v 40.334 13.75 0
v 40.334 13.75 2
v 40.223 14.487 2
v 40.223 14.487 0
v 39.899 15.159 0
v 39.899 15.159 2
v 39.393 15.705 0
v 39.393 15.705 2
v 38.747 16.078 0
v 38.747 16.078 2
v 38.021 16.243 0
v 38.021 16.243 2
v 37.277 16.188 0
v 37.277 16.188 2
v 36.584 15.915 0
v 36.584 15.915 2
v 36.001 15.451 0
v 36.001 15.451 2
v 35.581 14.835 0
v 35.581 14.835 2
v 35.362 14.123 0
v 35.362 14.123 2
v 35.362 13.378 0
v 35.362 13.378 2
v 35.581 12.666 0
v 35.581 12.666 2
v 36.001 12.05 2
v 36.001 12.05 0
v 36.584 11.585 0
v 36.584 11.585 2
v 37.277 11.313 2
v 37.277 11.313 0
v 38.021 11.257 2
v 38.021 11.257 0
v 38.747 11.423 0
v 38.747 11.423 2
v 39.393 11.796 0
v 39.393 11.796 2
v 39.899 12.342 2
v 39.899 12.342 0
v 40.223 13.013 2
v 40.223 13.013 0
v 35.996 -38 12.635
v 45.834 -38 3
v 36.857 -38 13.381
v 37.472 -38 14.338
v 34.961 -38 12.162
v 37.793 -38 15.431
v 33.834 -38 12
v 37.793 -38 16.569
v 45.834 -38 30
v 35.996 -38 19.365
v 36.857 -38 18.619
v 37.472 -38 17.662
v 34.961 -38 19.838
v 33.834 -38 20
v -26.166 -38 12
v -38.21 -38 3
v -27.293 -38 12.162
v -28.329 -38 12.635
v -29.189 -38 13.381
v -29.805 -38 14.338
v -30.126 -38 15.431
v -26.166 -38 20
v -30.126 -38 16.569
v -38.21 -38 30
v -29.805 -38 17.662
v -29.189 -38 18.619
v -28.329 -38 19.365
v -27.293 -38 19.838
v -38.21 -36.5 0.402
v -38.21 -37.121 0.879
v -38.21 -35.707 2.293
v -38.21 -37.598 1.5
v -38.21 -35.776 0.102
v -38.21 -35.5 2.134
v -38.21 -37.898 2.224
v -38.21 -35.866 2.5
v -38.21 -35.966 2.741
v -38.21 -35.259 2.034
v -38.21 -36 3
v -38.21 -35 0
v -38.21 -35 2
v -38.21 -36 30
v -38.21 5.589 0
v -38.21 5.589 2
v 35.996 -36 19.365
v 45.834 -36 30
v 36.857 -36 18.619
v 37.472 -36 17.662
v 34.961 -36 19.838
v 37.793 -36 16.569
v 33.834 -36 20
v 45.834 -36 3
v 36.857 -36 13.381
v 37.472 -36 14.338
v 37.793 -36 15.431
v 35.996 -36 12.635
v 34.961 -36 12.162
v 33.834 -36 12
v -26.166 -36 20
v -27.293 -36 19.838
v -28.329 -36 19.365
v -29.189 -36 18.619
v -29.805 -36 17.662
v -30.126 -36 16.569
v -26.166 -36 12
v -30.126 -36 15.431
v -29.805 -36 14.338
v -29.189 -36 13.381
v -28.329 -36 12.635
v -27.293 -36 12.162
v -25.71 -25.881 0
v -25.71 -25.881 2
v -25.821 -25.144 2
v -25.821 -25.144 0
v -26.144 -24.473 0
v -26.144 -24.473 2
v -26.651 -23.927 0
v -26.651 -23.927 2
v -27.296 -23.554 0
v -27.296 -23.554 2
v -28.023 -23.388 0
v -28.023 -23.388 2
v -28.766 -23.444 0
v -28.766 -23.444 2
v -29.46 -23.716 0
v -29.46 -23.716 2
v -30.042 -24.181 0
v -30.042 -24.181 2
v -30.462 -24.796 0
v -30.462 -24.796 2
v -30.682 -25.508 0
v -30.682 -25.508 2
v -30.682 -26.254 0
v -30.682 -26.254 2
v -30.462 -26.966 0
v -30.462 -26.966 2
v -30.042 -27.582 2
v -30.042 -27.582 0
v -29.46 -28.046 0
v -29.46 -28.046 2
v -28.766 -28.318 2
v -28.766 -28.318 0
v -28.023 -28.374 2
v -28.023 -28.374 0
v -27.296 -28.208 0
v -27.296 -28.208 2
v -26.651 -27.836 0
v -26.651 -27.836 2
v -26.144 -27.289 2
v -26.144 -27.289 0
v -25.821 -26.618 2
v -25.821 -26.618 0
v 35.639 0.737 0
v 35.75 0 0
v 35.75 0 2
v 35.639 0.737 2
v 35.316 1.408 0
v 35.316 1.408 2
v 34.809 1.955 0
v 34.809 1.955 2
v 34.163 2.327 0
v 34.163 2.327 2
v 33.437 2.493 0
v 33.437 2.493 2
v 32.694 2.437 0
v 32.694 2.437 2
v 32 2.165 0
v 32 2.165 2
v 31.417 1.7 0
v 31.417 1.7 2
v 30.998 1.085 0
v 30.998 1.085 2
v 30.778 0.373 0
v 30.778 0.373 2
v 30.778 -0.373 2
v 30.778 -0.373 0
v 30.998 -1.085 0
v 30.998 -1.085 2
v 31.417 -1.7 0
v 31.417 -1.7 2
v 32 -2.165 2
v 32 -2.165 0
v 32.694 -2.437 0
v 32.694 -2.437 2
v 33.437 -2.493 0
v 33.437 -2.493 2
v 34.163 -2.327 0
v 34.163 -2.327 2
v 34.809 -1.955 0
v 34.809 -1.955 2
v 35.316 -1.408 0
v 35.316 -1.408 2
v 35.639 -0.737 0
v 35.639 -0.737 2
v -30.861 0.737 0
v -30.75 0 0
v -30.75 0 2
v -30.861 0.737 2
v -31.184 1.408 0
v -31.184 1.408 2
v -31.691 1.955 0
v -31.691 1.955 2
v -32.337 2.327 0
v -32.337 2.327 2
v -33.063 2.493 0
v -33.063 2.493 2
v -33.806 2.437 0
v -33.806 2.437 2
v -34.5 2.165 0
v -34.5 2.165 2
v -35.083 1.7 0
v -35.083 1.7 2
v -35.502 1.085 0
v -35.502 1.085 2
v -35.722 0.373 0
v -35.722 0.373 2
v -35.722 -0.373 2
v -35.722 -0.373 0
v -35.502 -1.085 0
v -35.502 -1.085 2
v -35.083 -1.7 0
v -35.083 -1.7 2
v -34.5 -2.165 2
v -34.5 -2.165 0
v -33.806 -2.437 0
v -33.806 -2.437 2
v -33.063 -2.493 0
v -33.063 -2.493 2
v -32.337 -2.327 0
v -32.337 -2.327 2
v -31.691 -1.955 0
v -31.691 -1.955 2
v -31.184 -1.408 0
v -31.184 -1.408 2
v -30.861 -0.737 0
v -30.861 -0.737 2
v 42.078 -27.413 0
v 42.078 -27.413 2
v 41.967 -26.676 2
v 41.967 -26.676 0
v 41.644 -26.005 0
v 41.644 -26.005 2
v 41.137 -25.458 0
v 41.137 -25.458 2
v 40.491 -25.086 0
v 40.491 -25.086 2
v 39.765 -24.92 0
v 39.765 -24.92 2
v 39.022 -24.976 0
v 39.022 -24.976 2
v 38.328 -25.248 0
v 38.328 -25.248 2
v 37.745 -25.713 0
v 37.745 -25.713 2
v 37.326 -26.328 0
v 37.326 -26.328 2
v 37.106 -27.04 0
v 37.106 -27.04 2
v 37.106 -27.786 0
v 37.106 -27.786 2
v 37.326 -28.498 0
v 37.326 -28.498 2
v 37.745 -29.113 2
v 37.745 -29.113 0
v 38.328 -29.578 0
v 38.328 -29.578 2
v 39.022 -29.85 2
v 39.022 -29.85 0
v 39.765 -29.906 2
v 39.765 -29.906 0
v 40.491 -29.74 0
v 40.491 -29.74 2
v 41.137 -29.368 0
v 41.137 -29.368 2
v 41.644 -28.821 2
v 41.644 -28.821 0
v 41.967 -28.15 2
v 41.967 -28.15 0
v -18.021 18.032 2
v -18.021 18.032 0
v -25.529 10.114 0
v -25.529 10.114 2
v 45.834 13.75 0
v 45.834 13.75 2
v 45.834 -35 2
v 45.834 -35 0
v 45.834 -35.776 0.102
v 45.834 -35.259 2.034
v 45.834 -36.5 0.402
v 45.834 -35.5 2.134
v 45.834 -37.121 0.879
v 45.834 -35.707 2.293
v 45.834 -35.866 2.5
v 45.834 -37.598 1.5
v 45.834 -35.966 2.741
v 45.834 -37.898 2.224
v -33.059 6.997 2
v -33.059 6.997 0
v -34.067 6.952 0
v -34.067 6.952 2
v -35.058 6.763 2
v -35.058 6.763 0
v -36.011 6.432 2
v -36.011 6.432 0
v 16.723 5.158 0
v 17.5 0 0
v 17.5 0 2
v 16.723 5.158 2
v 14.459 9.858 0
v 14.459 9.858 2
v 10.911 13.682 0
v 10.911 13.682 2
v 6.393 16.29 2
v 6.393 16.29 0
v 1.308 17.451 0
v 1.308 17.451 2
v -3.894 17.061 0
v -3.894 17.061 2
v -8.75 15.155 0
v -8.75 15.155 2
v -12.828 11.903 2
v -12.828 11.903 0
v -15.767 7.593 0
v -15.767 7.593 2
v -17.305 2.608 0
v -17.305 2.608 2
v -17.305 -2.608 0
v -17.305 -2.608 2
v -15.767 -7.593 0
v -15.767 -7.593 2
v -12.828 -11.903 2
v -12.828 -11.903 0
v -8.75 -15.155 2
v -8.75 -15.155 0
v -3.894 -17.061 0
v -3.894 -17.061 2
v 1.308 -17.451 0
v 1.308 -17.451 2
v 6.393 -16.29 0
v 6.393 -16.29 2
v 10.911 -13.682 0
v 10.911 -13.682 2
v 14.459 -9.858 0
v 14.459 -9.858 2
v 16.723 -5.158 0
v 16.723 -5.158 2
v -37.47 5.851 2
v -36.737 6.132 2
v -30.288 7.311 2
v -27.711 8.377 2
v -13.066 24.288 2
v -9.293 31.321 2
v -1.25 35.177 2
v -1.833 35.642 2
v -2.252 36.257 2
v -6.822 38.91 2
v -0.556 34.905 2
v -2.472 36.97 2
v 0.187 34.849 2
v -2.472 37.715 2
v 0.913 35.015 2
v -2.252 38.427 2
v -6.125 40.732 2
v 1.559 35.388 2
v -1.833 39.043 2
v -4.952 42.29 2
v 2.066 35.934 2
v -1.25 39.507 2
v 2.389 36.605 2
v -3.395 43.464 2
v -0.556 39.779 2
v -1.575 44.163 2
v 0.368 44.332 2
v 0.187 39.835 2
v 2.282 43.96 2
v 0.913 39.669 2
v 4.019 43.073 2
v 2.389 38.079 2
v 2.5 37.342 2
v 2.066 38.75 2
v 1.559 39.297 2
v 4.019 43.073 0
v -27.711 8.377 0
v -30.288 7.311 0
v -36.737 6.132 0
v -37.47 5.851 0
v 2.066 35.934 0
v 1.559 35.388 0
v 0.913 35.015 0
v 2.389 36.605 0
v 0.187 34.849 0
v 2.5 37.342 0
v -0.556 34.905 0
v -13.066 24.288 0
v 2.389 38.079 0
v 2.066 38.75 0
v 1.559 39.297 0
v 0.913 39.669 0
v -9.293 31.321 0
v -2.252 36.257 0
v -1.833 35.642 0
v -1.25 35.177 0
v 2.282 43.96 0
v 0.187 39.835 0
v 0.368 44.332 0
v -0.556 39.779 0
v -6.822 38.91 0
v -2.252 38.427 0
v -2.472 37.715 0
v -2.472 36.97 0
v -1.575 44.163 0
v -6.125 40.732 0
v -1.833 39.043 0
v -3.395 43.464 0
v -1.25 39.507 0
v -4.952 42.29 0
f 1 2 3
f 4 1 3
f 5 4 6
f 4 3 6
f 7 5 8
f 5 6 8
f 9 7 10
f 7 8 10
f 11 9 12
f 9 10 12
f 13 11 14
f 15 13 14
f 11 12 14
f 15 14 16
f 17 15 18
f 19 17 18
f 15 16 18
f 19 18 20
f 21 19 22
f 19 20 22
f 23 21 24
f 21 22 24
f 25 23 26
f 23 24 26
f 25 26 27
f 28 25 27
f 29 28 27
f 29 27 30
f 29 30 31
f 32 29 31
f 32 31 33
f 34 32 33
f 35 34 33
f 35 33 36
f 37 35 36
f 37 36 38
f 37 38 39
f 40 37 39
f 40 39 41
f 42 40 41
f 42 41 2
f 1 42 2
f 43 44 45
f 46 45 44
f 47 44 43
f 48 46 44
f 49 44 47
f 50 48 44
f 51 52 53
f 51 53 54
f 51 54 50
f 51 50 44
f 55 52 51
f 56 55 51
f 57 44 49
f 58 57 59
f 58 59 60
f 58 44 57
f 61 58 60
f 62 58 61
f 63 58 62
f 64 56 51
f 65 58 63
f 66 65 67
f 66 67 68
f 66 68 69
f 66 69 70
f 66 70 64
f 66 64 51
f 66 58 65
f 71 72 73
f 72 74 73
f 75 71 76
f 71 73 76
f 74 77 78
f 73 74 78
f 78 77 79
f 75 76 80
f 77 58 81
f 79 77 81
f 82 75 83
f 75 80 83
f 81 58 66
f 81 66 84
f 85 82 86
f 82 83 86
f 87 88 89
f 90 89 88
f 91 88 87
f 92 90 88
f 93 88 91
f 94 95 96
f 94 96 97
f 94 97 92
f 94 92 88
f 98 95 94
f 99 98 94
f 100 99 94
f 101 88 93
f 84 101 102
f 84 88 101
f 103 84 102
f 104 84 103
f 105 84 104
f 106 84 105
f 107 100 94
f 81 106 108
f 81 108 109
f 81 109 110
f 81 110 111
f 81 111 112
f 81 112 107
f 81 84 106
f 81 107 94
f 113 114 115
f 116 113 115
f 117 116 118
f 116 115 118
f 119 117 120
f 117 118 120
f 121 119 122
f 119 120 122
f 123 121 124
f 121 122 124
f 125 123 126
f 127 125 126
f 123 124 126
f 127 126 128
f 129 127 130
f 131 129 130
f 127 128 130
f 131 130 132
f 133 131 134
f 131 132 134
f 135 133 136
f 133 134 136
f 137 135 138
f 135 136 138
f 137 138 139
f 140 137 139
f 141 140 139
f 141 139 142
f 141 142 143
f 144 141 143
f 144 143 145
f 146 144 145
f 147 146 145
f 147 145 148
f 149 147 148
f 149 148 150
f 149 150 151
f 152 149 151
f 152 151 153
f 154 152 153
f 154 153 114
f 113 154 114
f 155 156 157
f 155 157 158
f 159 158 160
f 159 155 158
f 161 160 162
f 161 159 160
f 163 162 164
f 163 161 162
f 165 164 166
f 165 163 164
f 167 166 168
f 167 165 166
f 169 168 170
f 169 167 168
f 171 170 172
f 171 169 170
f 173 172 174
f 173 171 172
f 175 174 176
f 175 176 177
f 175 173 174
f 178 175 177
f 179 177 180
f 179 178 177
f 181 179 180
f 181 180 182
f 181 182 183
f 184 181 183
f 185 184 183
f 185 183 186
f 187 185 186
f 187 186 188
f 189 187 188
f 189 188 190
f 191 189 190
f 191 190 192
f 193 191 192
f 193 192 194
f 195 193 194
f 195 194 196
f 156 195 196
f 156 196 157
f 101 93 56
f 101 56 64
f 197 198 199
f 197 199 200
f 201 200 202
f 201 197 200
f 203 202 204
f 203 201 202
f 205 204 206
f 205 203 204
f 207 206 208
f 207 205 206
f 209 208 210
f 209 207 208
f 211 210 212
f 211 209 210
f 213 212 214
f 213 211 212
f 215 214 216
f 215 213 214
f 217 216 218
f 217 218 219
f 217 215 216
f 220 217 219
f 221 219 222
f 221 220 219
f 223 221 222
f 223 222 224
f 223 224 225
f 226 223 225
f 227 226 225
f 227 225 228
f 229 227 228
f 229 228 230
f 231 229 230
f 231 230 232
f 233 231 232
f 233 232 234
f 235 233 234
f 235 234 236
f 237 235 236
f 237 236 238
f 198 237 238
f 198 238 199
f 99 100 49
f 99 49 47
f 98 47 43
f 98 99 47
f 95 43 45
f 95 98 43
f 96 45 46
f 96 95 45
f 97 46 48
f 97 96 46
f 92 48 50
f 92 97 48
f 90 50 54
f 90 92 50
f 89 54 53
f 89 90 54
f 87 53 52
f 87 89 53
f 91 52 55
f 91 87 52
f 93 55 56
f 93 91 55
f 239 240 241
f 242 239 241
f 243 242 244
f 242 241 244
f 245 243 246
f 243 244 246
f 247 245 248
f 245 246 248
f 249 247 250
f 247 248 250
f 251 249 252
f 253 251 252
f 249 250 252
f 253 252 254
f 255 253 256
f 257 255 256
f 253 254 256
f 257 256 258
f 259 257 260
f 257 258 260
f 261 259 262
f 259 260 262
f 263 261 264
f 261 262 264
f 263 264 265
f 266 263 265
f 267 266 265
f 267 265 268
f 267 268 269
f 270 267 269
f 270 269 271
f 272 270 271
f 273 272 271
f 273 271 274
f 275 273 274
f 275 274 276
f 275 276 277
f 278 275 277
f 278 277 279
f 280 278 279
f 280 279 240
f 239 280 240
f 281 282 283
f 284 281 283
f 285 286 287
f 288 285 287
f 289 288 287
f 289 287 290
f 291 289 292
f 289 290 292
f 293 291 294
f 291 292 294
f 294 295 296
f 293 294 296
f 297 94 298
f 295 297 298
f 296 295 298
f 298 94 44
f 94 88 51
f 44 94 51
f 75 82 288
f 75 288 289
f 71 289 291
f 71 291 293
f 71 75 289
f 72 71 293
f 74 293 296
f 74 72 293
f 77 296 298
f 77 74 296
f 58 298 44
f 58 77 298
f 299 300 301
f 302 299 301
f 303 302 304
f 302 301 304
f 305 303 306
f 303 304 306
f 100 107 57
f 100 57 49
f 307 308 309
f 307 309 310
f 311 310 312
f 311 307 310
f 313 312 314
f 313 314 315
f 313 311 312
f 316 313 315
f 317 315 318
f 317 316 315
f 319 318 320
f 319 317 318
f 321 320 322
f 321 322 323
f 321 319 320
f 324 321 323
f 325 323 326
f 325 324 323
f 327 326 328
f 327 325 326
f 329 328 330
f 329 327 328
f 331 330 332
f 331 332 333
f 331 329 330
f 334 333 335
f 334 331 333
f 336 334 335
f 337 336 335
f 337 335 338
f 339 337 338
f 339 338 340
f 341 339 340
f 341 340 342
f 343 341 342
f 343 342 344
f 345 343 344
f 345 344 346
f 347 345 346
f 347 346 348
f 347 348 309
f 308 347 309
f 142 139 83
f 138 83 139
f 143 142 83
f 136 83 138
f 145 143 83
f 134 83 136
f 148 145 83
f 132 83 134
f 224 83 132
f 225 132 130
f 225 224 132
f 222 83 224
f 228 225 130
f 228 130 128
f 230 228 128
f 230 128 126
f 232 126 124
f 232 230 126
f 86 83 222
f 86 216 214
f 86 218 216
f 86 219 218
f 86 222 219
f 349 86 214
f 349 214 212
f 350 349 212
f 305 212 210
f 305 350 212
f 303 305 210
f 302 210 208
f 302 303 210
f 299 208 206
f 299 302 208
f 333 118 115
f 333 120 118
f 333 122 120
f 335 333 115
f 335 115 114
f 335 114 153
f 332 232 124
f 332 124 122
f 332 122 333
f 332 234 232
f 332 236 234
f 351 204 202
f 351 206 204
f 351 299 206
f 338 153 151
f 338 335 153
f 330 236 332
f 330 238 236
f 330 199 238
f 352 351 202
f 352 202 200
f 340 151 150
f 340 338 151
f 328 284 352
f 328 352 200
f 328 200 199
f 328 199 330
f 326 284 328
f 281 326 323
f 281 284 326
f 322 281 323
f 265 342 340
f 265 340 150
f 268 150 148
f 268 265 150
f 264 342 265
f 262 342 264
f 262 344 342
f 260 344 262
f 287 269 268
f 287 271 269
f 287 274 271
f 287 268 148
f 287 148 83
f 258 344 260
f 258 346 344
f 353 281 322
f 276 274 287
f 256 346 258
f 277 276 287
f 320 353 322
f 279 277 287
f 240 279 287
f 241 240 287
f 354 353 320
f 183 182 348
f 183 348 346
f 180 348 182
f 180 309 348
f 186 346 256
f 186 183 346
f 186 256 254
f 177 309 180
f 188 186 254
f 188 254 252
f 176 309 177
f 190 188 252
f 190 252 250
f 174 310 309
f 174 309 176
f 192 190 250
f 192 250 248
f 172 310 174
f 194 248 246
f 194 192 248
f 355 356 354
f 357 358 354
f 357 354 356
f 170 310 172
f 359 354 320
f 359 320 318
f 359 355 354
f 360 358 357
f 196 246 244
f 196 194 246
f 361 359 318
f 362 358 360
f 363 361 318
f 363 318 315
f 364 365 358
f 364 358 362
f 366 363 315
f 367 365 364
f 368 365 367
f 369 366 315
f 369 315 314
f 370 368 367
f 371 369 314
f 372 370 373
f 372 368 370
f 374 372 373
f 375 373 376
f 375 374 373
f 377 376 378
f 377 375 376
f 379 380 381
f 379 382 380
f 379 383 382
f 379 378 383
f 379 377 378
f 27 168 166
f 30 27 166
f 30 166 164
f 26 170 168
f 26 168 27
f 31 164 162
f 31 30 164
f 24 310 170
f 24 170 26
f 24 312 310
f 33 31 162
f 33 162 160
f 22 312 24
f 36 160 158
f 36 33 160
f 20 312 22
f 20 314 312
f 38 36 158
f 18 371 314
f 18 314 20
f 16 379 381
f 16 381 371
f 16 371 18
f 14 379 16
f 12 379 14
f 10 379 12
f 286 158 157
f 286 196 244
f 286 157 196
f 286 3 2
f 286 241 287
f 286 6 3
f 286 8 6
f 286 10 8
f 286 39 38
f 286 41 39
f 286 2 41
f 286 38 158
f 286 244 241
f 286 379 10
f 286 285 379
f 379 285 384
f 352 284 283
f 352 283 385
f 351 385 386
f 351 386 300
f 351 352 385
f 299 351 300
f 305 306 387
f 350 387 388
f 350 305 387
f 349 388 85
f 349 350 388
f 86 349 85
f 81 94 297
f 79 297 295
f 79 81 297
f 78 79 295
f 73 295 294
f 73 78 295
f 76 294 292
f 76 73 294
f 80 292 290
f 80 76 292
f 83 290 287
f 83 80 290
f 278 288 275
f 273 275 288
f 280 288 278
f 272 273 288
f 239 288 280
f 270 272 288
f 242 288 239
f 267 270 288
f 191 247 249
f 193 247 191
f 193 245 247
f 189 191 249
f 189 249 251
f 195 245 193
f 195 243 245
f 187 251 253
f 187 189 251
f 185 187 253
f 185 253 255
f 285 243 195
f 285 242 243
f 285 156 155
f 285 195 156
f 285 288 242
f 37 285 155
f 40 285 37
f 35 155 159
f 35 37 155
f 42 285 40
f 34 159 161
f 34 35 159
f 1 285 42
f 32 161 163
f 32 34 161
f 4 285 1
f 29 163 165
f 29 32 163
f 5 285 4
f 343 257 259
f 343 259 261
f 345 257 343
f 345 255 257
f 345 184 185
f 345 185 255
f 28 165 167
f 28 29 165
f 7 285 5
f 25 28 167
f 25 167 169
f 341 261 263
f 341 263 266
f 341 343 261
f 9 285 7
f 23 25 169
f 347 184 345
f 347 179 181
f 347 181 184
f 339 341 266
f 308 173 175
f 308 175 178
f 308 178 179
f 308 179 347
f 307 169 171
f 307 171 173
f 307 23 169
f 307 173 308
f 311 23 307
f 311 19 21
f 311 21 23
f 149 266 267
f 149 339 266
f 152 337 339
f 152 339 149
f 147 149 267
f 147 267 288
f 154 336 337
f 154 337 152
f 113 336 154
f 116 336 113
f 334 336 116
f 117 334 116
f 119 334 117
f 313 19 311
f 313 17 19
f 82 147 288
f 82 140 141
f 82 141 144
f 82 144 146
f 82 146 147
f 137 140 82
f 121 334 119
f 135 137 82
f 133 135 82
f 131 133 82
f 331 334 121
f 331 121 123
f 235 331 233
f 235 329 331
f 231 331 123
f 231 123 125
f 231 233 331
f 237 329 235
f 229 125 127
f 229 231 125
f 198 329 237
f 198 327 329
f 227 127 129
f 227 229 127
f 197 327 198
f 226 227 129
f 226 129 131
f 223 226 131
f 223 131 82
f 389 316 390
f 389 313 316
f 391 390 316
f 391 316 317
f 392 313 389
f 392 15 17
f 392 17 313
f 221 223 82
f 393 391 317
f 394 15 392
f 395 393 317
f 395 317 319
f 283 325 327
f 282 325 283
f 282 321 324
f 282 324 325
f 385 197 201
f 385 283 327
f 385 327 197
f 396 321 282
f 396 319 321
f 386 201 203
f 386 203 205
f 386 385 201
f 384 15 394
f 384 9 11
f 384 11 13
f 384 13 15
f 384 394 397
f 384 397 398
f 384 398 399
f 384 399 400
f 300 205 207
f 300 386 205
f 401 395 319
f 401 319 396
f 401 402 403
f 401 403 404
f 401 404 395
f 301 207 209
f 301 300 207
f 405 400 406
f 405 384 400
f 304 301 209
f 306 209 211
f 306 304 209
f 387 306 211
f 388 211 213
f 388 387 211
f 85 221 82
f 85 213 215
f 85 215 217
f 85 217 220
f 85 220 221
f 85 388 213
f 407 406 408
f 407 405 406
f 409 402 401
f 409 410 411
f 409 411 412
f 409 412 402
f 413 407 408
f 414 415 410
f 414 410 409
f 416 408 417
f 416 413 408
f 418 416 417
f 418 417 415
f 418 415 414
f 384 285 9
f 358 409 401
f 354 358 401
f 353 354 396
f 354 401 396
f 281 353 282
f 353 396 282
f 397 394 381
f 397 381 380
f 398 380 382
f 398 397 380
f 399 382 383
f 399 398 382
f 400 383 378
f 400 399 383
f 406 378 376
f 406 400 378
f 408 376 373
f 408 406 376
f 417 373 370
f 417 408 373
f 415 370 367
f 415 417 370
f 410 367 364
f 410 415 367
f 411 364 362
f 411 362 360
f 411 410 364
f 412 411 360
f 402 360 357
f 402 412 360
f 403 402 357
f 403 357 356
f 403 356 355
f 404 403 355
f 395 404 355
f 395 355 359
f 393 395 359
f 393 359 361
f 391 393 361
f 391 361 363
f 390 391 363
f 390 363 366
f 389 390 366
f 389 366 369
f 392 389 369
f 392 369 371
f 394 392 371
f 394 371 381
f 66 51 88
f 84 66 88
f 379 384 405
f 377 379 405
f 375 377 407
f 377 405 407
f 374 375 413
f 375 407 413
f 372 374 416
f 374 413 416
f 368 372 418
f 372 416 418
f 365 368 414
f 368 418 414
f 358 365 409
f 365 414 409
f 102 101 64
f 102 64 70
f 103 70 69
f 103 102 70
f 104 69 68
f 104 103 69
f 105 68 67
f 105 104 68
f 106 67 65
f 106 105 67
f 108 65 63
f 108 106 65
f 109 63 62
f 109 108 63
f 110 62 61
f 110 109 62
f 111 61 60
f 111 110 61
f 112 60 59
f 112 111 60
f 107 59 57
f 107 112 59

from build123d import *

# Parameters (mm, degrees)
SKETCH1_R                  = 2.138138955
SKETCH1_R_2                = 2.5
SKETCH1_R_3                = 17.5
BOSS_EXTRUDE1_DEPTH        = 4
FILLET4_R                  = 10
FILLET8_R                  = 30
SKETCH2_R                  = 2
BOSS_EXTRUDE2_DEPTH        = 4
FILLET10_R                 = 4
SKETCH3_R                  = 2.5
SKETCH3_R_2                = 2.138138955
BOSS_EXTRUDE3_DEPTH        = 4
SKETCH4_W                  = 172.930913202
SKETCH4_H                  = 8.75
BOSS_EXTRUDE4_DEPTH        = 4
CUT_EXTRUDE1_REACH         = 123.687
CONVERT_SOLID1_START       = 2
CONVERT_SOLID1_OUTLINE_R   = 2.138138955
CONVERT_SOLID1_OUTLINE_R_2 = 2.5
CONVERT_SOLID1_OUTLINE_R_3 = 17.5
CONVERT_SOLID1_OUTLINE_R_4 = 2
CONVERT_SOLID1_DEPTH       = 2
EDGE_FLANGE1_DEPTH         = 159.04353712
CUT_EXTRUDE2_REACH         = 144.058
CUT_EXTRUDE3_REACH         = 126.803
SKETCH15_R                 = 2.5
CUT_EXTRUDE4_DEPTH         = 126.266876508
CUT_EXTRUDE4_DEPTH_BACK    = 126.266876508
SKETCH16_W                 = 75
SKETCH16_H                 = 51.529180682
SKETCH17_R                 = 2.5
CUT_EXTRUDE5_DEPTH         = 70.648854106


# Read off the part's stored shape, not the designer's step: Convert-Solid1
# Sheet-metal steps are written as plain solids
with BuildPart() as part:
    # Sketch1 → Boss-Extrude1 (new body)
    with BuildSketch(Plane.XY):
        with BuildLine():
            Line((57.269086776, 5.73122513), (4.019086776, 43.073392983))
            ThreePointArc((4.019086776, 43.073392983), (-2.50930732, 43.876949929), (-6.822053045, 38.910476579))
            ThreePointArc((-6.822053045, 38.910476579), (-11.022997654, 27.721065982), (-18.021357649, 18.032216591))
            Line((-18.021357649, 18.032216591), (-29.508168792, 5.915969846))
            ThreePointArc((-29.508168792, 5.915969846), (-34.635809661, 6.861452586), (-38.994562647, 4))
            Line((-38.994562647, 4), (-49.854306759, 4))
            ThreePointArc((-49.854306759, 4), (-50.678108889, 3.992458813), (-51.501911019, 4))
            Line((-51.501911019, 4), (-103.25, 4))
            ThreePointArc((-103.25, 4), (-113.23757059, -5.501568758), (-104.245623443, -15.950313259))
            Line((-104.245623443, -15.950313259), (-2.613511537, -26.119572306))
            ThreePointArc((-2.613511537, -26.119572306), (3.534961315, -26.010892882), (9.48943662, -24.474743975))
            Line((9.48943662, -24.474743975), (55.780516432, -6.526598393))
            ThreePointArc((55.780516432, -6.526598393), (60.198948476, -0.84386911), (57.269086776, 5.73122513))
        make_face()
        with Locations((-93.25, -6)):
            Circle(SKETCH1_R, mode=Mode.SUBTRACT)
        with Locations((-69.427494877, -8.934369314)):
            Circle(SKETCH1_R_2, mode=Mode.SUBTRACT)
        with Locations((-43.206195341, -14.414354512)):
            Circle(SKETCH1_R_2, mode=Mode.SUBTRACT)
        with Locations((-33.25, 0)):
            Circle(SKETCH1_R_2, mode=Mode.SUBTRACT)
        Circle(SKETCH1_R_3, mode=Mode.SUBTRACT)
        with Locations((33.25, 0)):
            Circle(SKETCH1_R_2, mode=Mode.SUBTRACT)
        with Locations((53.25, 0)):
            Circle(SKETCH1_R_2, mode=Mode.SUBTRACT)
        with Locations((0, 37.342167854)):
            Circle(SKETCH1_R_2, mode=Mode.SUBTRACT)
    extrude(amount=BOSS_EXTRUDE1_DEPTH)

    # Fillet4
    fillet4_edges = [part.edges().sort_by_distance(p)[0] for p in [
        (-29.508168792, 5.915969846, 2),
    ]]
    fillet(fillet4_edges, radius=FILLET4_R)

    # Fillet8
    fillet8_edges = [part.edges().sort_by_distance(p)[0] for p in [
        (-38.994562647, 4, 2),
    ]]
    fillet(fillet8_edges, radius=FILLET8_R)

    # Sketch2 → Boss-Extrude2 (add, through all)
    with BuildSketch(Plane(origin=(0, 0, 0), x_dir=(-1, 0, 0), z_dir=(0, 0, -1))):
        Polygon((113.243669527, -5.64423408), (112.561112682, 13.529180682), (98.666188695, 13.529180682), (98.666188695, 2.111142935), align=None)
        with Locations((105.421921095, 7.587030731)):
            Circle(SKETCH2_R, mode=Mode.SUBTRACT)
    extrude(amount=-BOSS_EXTRUDE2_DEPTH)

    # Fillet10
    fillet10_edges = [part.edges().sort_by_distance(p)[0] for p in [
        (-98.666188695, 4, 2),
        (-98.666188695, 13.529180682, 2),
        (-112.561112682, 13.529180682, 2),
    ]]
    fillet(fillet10_edges, radius=FILLET10_R)

    # Sketch3 → Boss-Extrude3 (add)
    # profile 1 of 4: a face of its own
    with BuildSketch(Plane(origin=(0, 0, 0), x_dir=(-1, 0, 0), z_dir=(0, 0, -1))):
        with BuildLine():
            Line((-59.721152147, -26.25), (0, -26.25))
            ThreePointArc((0, -26.25), (-4.827031731, -25.802369362), (-9.48943662, -24.474743975))
            Line((-9.48943662, -24.474743975), (-55.780516432, -6.526598393))
            ThreePointArc((-55.780516432, -6.526598393), (-58.776157504, -4.296694455), (-60.198948476, -0.84386911))
            Line((-60.198948476, -0.84386911), (-59.721152147, -26.25))
        make_face()
    # profile 2 of 4: a face of its own
    with BuildSketch(Plane(origin=(0, 0, 0), x_dir=(-1, 0, 0), z_dir=(0, 0, -1))):
        with BuildLine():
            ThreePointArc((-9.48943662, -24.474743975), (-4.827031731, -25.802369362), (0, -26.25))
            Line((0, -26.25), (-50.316238181, 5.820300559))
            Line((-50.316238181, 5.820300559), (-60.198948476, -0.84386911))
            ThreePointArc((-60.198948476, -0.84386911), (-58.776157504, -4.296694455), (-55.780516432, -6.526598393))
            Line((-55.780516432, -6.526598393), (-9.48943662, -24.474743975))
        make_face()
        with Locations(Location((-53.25, 0, 0), (0, 0, 180))):
            Circle(SKETCH3_R, mode=Mode.SUBTRACT)
    # profile 3 of 4: a face of its own
    with BuildSketch(Plane(origin=(0, 0, 0), x_dir=(-1, 0, 0), z_dir=(0, 0, -1))):
        with BuildLine():
            Line((30.255475695, -5.847942527), (0, -26.25))
            ThreePointArc((0, -26.25), (1.30838201, -26.2173728), (2.613511537, -26.119572306))
            Line((2.613511537, -26.119572306), (104.245623443, -15.950313259))
            ThreePointArc((104.245623443, -15.950313259), (110.356292372, -13.0356669), (113.209761055, -6.896191789))
            Line((113.209761055, -6.896191789), (113.209761055, -4.69172559))
            Line((113.209761055, -4.69172559), (113.006516175, 1.017540127))
            Line((113.006516175, 1.017540127), (30.255475695, -5.847942527))
        make_face()
        with Locations(Location((43.206195341, -14.414354512, 0), (0, 0, 180))):
            Circle(SKETCH3_R, mode=Mode.SUBTRACT)
        with Locations(Location((69.427494877, -8.934369314, 0), (0, 0, 180))):
            Circle(SKETCH3_R, mode=Mode.SUBTRACT)
        with Locations(Location((93.25, -6, 0), (0, 0, 180))):
            Circle(SKETCH3_R_2, mode=Mode.SUBTRACT)
    # profile 4 of 4: a face of its own
    with BuildSketch(Plane(origin=(0, 0, 0), x_dir=(-1, 0, 0), z_dir=(0, 0, -1))):
        with BuildLine():
            ThreePointArc((2.613511537, -26.119572306), (1.30838201, -26.2173728), (0, -26.25))
            Line((0, -26.25), (113.209761055, -26.25))
            Line((113.209761055, -26.25), (113.209761055, -6.896191789))
            ThreePointArc((113.209761055, -6.896191789), (110.356292372, -13.0356669), (104.245623443, -15.950313259))
            Line((104.245623443, -15.950313259), (2.613511537, -26.119572306))
        make_face()
    extrude(amount=-BOSS_EXTRUDE3_DEPTH)

    # Sketch4 → Boss-Extrude4 (add)
    with BuildSketch(Plane(origin=(0, 0, 0), x_dir=(-1, 0, 0), z_dir=(0, 0, -1))):
        with Locations((26.744304454, -30.625)):
            Rectangle(SKETCH4_W, SKETCH4_H)
    extrude(amount=-BOSS_EXTRUDE4_DEPTH)

    # Sketch5 → Cut-Extrude1 (cut, up to next)
    with BuildSketch(Plane(origin=(0, 0, 0), x_dir=(-1, 0, 0), z_dir=(0, 0, -1)), mode=Mode.PRIVATE) as cut_extrude1_sk1:
        Polygon((-45.833776065, 13.750366764), (-45.833776065, -35), (-59.721152147, -35), (-65.850826746, 7.196032961), align=None)
    cut_extrude1_tool1 = extrude(cut_extrude1_sk1.sketch, amount=-CUT_EXTRUDE1_REACH, mode=Mode.PRIVATE) & part.part
    add(cut_extrude1_tool1.solids().sort_by_distance((54.242954, -10.781509, 0))[0], mode=Mode.SUBTRACT)

    # Convert-Solid1 outline → Convert-Solid1 (cut)
    with BuildSketch(Plane.XY.offset(CONVERT_SOLID1_START)):
        with BuildLine():
            ThreePointArc((-33.058799925, 6.997388265), (-34.565645358, 6.875251071), (-36.011125314, 6.432432432))
            ThreePointArc((-36.011125314, 6.432432432), (-41.804115022, 4.614399555), (-47.844519519, 4))
            Line((-47.844519519, 4), (-49.854306759, 4))
            ThreePointArc((-49.854306759, 4), (-50.678108889, 3.992458813), (-51.501911019, 4))
            Line((-51.501911019, 4), (-94.666188695, 4))
            ThreePointArc((-94.666188695, 4), (-97.49461582, 5.171572875), (-98.666188695, 8))
            Line((-98.666188695, 8), (-98.666188695, 9.529180682))
            ThreePointArc((-98.666188695, 9.529180682), (-99.837761571, 12.357607807), (-102.666188695, 13.529180682))
            Line((-102.666188695, 13.529180682), (-108.700975401, 13.529180682))
            ThreePointArc((-108.700975401, 13.529180682), (-111.478633995, 12.407481003), (-112.698443211, 9.67148705))
            Line((-112.698443211, 9.67148705), (-113.243669527, -5.64423408))
            ThreePointArc((-113.243669527, -5.64423408), (-113.246334204, -6.2707443), (-113.209761055, -6.896191789))
            Line((-113.209761055, -6.896191789), (-113.209761055, -35))
            Line((-113.209761055, -35), (45.833776065, -35))
            Line((45.833776065, -35), (45.833776065, 13.750366764))
            Line((45.833776065, 13.750366764), (4.019086776, 43.073392983))
            ThreePointArc((4.019086776, 43.073392983), (-2.509307476, 43.876949869), (-6.82205312, 38.910476252))
            ThreePointArc((-6.82205312, 38.910476252), (-11.022997734, 27.721065834), (-18.021357649, 18.032216591))
            Line((-18.021357649, 18.032216591), (-25.528601129, 10.113603388))
            ThreePointArc((-25.528601129, 10.113603388), (-28.96185533, 7.75360629), (-33.058799925, 6.997388265))
        make_face()
        with Locations((-93.25, -6)):
            Circle(CONVERT_SOLID1_OUTLINE_R, mode=Mode.SUBTRACT)
        with Locations((-69.427494877, -8.934369314)):
            Circle(CONVERT_SOLID1_OUTLINE_R_2, mode=Mode.SUBTRACT)
        with Locations((-43.206195341, -14.414354512)):
            Circle(CONVERT_SOLID1_OUTLINE_R_2, mode=Mode.SUBTRACT)
        with Locations((-33.25, 0)):
            Circle(CONVERT_SOLID1_OUTLINE_R_2, mode=Mode.SUBTRACT)
        Circle(CONVERT_SOLID1_OUTLINE_R_3, mode=Mode.SUBTRACT)
        with Locations((33.25, 0)):
            Circle(CONVERT_SOLID1_OUTLINE_R_2, mode=Mode.SUBTRACT)
        with Locations((-105.421921095, 7.587030731)):
            Circle(CONVERT_SOLID1_OUTLINE_R_4, mode=Mode.SUBTRACT)
        with Locations((0, 37.342167854)):
            Circle(CONVERT_SOLID1_OUTLINE_R_2, mode=Mode.SUBTRACT)
    extrude(amount=CONVERT_SOLID1_DEPTH, mode=Mode.SUBTRACT)

    # Edge-Flange1 section (across the edge) → Edge-Flange1 (add)
    with BuildSketch(Plane(origin=(-113.209761055, -36, 2), x_dir=(0, 1, 0), z_dir=(1, 0, 0))):
        with BuildLine():
            Line((-2, 1), (-2, 28))
            Line((-2, 28), (0, 28))
            Line((0, 28), (0, 1))
            ThreePointArc((0, 1), (0.292893219, 0.292893219), (1, 0))
            Line((1, 0), (1, -2))
            ThreePointArc((1, -2), (-1.121320344, -1.121320344), (-2, 1))
        make_face()
    extrude(amount=EDGE_FLANGE1_DEPTH)

    # Sketch14 → Cut-Extrude2 (cut, up to next)
    with BuildSketch(Plane(origin=(0, -36, 0), x_dir=(1, 0, 0), z_dir=(0, 1, 0)), mode=Mode.PRIVATE) as cut_extrude2_sk1:
        with BuildLine():
            Line((-26.166223935, -12), (33.833776065, -12))
            ThreePointArc((33.833776065, -12), (37.833776065, -16), (33.833776065, -20))
            Line((33.833776065, -20), (-26.166223935, -20))
            ThreePointArc((-26.166223935, -20), (-30.166223935, -16), (-26.166223935, -12))
        make_face()
    cut_extrude2_tool1 = extrude(cut_extrude2_sk1.sketch, amount=-CUT_EXTRUDE2_REACH, mode=Mode.PRIVATE) & part.part
    add(cut_extrude2_tool1.solids().sort_by_distance((3.833776, -36, 16))[0], mode=Mode.SUBTRACT)

    # Sketch15 → Cut-Extrude3 (cut, up to next)
    with BuildSketch(Plane.XY.offset(2), mode=Mode.PRIVATE) as cut_extrude3_sk1:
        with Locations((-105.421921095, 7.587030731)):
            Circle(SKETCH15_R)
    cut_extrude3_tool1 = extrude(cut_extrude3_sk1.sketch, amount=-CUT_EXTRUDE3_REACH, mode=Mode.PRIVATE) & part.part
    # Sketch15 → Cut-Extrude3 (cut, up to next)
    with BuildSketch(Plane.XY.offset(2), mode=Mode.PRIVATE) as cut_extrude3_sk2:
        with Locations((-105.421921095, -27.412969269)):
            Circle(SKETCH15_R)
    cut_extrude3_tool2 = extrude(cut_extrude3_sk2.sketch, amount=-CUT_EXTRUDE3_REACH, mode=Mode.PRIVATE) & part.part
    # Sketch15 → Cut-Extrude3 (cut, up to next)
    with BuildSketch(Plane.XY.offset(2), mode=Mode.PRIVATE) as cut_extrude3_sk3:
        with Locations((39.578078905, -27.412969269)):
            Circle(SKETCH15_R)
    cut_extrude3_tool3 = extrude(cut_extrude3_sk3.sketch, amount=-CUT_EXTRUDE3_REACH, mode=Mode.PRIVATE) & part.part
    add(cut_extrude3_tool1.solids().sort_by_distance((-105.421921, 7.587031, 2))[0], mode=Mode.SUBTRACT)
    add(cut_extrude3_tool2.solids().sort_by_distance((-105.421921, -27.412969, 2))[0], mode=Mode.SUBTRACT)
    add(cut_extrude3_tool3.solids().sort_by_distance((39.578079, -27.412969, 2))[0], mode=Mode.SUBTRACT)

    # Sketch16 → Cut-Extrude4 (cut, two sides: drawn at the far end of the back side and taken through both)
    with BuildSketch(Plane(origin=(0, 0, 0), x_dir=(-1, 0, 0), z_dir=(0, 0, -1)).offset(-CUT_EXTRUDE4_DEPTH_BACK)):
        with Locations((75.709761055, -12.235409659)):
            Rectangle(SKETCH16_W, SKETCH16_H)
    extrude(amount=CUT_EXTRUDE4_DEPTH + CUT_EXTRUDE4_DEPTH_BACK, mode=Mode.SUBTRACT)


with BuildPart() as cut_extrude4_kept_piece:
    # of the separate pieces the step leaves, the one the design keeps (cut_extrude4_pieces_kept)
    add(part.part.solids().sort_by_distance((-36.011125314, 6.432432432, 0))[0])

    # Sketch17 → Cut-Extrude5 (cut, through all)
    with BuildSketch(Plane.XY.offset(2)):
        with Locations((-28.209761055, -25.881079341)):
            Circle(SKETCH17_R)
        with Locations((37.833776065, 13.750366764)):
            Circle(SKETCH17_R)
    extrude(amount=-CUT_EXTRUDE5_DEPTH, mode=Mode.SUBTRACT)


solid = cut_extrude4_kept_piece.part
